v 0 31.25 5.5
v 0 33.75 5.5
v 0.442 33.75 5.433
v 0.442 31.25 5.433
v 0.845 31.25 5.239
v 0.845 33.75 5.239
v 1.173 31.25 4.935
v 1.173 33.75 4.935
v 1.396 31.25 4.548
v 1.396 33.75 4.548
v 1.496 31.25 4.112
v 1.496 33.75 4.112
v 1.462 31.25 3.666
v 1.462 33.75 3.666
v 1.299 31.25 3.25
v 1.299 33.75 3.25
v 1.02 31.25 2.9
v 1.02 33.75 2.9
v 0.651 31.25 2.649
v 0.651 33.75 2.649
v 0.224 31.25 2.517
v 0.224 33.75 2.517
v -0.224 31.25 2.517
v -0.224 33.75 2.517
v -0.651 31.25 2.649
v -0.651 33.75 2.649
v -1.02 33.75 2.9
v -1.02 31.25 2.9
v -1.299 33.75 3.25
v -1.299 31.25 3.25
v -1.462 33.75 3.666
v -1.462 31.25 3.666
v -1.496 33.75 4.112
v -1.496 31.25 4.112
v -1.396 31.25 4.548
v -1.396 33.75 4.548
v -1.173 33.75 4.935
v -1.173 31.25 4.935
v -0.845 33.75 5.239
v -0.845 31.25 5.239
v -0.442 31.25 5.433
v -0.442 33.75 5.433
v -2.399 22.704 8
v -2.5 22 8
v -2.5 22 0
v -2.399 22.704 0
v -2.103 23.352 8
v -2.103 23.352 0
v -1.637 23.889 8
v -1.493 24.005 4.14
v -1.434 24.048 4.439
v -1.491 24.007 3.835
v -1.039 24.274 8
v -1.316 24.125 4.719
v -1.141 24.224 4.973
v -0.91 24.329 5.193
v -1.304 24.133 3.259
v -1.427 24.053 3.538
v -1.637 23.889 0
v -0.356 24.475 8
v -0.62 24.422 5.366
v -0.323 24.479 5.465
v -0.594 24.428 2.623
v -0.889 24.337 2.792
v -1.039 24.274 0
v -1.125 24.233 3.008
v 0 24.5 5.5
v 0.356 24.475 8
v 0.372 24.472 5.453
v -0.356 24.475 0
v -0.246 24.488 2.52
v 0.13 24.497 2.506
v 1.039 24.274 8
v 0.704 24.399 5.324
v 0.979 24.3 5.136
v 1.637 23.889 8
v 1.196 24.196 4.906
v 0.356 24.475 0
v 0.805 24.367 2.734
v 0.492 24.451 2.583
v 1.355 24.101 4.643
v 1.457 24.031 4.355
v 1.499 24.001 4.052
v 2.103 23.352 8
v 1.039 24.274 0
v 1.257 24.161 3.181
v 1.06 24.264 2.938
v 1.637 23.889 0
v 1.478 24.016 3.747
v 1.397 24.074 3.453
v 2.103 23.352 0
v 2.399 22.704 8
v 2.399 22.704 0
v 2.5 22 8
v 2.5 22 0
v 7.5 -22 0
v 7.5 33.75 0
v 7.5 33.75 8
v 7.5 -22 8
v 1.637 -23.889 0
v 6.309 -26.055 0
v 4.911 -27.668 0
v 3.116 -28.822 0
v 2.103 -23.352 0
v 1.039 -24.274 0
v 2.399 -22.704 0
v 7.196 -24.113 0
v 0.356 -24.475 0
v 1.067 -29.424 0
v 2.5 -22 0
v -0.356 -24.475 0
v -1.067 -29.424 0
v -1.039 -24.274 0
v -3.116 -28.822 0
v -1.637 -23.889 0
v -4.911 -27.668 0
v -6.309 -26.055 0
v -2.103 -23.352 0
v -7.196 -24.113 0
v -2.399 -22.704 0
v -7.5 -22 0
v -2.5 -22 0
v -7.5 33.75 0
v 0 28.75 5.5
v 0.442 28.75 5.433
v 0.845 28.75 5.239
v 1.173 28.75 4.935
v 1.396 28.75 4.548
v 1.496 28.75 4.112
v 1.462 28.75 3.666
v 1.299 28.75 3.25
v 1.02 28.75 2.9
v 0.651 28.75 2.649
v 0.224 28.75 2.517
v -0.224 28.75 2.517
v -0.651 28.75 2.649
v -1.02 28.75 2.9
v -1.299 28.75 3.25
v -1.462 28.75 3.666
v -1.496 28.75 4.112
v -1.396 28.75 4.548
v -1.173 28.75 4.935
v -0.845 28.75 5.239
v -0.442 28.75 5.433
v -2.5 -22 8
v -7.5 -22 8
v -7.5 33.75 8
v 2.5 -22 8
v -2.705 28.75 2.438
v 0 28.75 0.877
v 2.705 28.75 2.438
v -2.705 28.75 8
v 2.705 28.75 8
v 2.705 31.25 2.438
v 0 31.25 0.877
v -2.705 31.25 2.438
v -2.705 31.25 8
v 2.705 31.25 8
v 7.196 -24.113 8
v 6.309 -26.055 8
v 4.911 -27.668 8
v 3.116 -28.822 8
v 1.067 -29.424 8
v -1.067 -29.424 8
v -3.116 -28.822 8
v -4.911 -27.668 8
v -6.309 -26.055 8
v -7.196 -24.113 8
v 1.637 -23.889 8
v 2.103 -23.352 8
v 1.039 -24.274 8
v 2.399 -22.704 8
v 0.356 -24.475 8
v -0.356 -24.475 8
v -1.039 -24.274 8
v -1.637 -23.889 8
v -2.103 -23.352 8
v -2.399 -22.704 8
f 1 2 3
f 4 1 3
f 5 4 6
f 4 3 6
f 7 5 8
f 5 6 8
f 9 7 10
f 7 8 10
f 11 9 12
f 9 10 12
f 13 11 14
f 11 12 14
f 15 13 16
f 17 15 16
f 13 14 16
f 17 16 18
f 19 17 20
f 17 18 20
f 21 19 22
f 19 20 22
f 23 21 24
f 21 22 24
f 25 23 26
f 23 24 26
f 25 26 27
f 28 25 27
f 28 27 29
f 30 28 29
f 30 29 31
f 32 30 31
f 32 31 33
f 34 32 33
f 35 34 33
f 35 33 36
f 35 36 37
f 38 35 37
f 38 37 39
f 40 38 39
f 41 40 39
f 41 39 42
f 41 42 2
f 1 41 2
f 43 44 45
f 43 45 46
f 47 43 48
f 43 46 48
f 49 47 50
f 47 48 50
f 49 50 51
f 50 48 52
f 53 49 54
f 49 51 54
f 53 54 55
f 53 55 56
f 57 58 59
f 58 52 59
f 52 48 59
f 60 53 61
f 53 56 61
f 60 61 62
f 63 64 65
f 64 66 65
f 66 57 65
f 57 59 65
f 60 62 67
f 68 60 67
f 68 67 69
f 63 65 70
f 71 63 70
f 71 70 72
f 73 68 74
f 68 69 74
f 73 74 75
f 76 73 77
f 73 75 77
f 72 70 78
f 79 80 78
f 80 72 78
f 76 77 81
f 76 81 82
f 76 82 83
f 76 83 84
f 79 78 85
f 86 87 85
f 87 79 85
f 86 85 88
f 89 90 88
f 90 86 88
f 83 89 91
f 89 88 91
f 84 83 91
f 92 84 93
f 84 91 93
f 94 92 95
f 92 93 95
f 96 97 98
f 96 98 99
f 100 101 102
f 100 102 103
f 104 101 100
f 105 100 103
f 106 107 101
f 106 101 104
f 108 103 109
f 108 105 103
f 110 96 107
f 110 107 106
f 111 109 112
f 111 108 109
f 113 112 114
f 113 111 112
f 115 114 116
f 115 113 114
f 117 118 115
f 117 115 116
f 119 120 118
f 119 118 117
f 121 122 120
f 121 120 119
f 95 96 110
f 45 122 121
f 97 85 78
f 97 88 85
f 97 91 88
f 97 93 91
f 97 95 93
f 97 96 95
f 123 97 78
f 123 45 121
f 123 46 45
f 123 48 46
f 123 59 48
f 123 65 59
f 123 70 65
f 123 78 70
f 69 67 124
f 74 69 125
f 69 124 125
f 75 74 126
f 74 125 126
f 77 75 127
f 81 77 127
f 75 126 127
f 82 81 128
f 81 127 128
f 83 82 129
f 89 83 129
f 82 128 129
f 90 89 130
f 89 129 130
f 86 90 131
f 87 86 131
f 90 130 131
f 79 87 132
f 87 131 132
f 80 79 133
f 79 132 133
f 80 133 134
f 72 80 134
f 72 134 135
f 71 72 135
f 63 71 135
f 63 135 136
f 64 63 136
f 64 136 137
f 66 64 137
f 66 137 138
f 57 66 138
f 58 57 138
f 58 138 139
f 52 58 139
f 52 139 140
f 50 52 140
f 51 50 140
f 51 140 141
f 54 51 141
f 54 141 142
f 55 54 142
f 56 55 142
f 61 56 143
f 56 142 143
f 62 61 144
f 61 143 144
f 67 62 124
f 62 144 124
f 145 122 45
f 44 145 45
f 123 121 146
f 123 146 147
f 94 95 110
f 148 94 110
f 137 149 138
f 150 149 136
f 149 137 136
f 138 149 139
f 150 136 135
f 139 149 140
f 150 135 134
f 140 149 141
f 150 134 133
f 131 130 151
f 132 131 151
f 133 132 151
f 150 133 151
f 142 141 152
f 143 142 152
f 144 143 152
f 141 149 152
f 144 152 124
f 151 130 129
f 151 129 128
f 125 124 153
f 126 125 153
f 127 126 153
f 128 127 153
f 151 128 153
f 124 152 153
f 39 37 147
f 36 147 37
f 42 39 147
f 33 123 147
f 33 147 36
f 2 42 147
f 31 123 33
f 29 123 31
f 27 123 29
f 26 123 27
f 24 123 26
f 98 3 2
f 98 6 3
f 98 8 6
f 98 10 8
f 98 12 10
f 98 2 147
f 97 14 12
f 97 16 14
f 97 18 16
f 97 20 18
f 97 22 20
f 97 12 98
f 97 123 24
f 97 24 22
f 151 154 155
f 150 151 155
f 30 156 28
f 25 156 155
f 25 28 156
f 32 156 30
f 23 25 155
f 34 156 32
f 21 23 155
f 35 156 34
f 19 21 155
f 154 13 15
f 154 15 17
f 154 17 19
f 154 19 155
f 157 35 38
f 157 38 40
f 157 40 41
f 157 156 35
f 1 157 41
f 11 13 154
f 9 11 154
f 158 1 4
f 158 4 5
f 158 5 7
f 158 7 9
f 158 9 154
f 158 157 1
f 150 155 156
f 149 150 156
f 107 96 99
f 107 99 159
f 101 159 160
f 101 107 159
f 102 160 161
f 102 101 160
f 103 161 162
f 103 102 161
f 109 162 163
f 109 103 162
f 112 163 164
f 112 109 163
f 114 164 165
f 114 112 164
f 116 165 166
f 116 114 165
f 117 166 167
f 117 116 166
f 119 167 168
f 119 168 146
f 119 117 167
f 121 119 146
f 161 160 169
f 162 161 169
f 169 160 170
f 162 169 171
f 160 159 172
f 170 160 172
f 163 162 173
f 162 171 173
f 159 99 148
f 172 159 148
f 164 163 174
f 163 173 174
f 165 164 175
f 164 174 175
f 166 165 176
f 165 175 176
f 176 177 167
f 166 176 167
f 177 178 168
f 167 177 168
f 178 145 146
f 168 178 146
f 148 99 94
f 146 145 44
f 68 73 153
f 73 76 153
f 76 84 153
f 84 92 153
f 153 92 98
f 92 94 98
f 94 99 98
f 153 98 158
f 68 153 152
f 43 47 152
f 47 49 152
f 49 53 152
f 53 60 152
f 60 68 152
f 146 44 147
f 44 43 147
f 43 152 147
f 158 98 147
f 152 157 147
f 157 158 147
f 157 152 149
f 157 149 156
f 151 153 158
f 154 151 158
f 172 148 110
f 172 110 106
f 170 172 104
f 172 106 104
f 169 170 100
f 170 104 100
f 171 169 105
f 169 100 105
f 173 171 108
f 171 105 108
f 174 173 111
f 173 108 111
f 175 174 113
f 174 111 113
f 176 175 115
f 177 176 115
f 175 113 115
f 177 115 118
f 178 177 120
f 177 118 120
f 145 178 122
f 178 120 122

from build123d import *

# Parameters (mm, degrees)
BOSS_EXTRUDE1_DEPTH     = 8
CUT_EXTRUDE2_START      = -2.5
CUT_EXTRUDE2_DEPTH      = 2.5
SKETCH4_W               = 5.41
SKETCH4_H               = 2.5
CUT_EXTRUDE3_DEPTH      = 4
CUT_EXTRUDE4_REACH      = 66.194
CUT_EXTRUDE4_END_RADIUS = 2.5
SKETCH5_R               = 1.5


with BuildPart() as part:
    # Sketch1 → Boss-Extrude1 (new body)
    with BuildSketch(Plane.XY):
        with BuildLine():
            Line((-7.5, 33.75), (7.5, 33.75))
            Line((7.5, 33.75), (7.5, -22))
            ThreePointArc((7.5, -22), (0, -29.5), (-7.5, -22))
            Line((-7.5, -22), (-7.5, 33.75))
        make_face()
        with BuildLine():
            Line((2.5, 22), (2.5, -22))
            ThreePointArc((2.5, -22), (0, -24.5), (-2.5, -22))
            Line((-2.5, -22), (-2.5, 22))
            ThreePointArc((-2.5, 22), (0, 24.5), (2.5, 22))
        make_face(mode=Mode.SUBTRACT)
    extrude(amount=BOSS_EXTRUDE1_DEPTH)

    # Sketch3 → Cut-Extrude2 (cut)
    with BuildSketch(Plane(origin=(0, 33.75, 0), x_dir=(1, 0, 0), z_dir=(0, 1, 0)).offset(CUT_EXTRUDE2_START)):
        Polygon((0, -7.123464956), (2.705, -5.561732478), (2.705, -2.438267522), (0, -0.876535044), (-2.705, -2.438267522), (-2.705, -5.561732478), align=None)
    extrude(amount=-CUT_EXTRUDE2_DEPTH, mode=Mode.SUBTRACT)

    # Sketch4 → Cut-Extrude3 (cut)
    with BuildSketch(Plane.XY.offset(8)):
        with Locations((0, 30)):
            Rectangle(SKETCH4_W, SKETCH4_H)
    extrude(amount=-CUT_EXTRUDE3_DEPTH, mode=Mode.SUBTRACT)

    # Cut-Extrude4: up to this cylinder (the profile starts outside it)
    cut_extrude4_end = Plane(origin=(0, 22, 4), z_dir=(0, 0, -1)) * Cylinder(CUT_EXTRUDE4_END_RADIUS, 138.388, mode=Mode.PRIVATE)
    # Sketch5 → Cut-Extrude4 (cut, up to the surface)
    with BuildSketch(Plane(origin=(0, 33.75, 0), x_dir=(1, 0, 0), z_dir=(0, 1, 0)), mode=Mode.PRIVATE) as cut_extrude4_sk1:
        with Locations(Location((0, -4, 0), (0, 0, 270))):
            Circle(SKETCH5_R)
    cut_extrude4_tool1 = extrude(cut_extrude4_sk1.sketch, amount=-CUT_EXTRUDE4_REACH, mode=Mode.PRIVATE) - cut_extrude4_end
    add(cut_extrude4_tool1.solids().sort_by_distance((0, 33.75, 4))[0], mode=Mode.SUBTRACT)


solid = part.part
